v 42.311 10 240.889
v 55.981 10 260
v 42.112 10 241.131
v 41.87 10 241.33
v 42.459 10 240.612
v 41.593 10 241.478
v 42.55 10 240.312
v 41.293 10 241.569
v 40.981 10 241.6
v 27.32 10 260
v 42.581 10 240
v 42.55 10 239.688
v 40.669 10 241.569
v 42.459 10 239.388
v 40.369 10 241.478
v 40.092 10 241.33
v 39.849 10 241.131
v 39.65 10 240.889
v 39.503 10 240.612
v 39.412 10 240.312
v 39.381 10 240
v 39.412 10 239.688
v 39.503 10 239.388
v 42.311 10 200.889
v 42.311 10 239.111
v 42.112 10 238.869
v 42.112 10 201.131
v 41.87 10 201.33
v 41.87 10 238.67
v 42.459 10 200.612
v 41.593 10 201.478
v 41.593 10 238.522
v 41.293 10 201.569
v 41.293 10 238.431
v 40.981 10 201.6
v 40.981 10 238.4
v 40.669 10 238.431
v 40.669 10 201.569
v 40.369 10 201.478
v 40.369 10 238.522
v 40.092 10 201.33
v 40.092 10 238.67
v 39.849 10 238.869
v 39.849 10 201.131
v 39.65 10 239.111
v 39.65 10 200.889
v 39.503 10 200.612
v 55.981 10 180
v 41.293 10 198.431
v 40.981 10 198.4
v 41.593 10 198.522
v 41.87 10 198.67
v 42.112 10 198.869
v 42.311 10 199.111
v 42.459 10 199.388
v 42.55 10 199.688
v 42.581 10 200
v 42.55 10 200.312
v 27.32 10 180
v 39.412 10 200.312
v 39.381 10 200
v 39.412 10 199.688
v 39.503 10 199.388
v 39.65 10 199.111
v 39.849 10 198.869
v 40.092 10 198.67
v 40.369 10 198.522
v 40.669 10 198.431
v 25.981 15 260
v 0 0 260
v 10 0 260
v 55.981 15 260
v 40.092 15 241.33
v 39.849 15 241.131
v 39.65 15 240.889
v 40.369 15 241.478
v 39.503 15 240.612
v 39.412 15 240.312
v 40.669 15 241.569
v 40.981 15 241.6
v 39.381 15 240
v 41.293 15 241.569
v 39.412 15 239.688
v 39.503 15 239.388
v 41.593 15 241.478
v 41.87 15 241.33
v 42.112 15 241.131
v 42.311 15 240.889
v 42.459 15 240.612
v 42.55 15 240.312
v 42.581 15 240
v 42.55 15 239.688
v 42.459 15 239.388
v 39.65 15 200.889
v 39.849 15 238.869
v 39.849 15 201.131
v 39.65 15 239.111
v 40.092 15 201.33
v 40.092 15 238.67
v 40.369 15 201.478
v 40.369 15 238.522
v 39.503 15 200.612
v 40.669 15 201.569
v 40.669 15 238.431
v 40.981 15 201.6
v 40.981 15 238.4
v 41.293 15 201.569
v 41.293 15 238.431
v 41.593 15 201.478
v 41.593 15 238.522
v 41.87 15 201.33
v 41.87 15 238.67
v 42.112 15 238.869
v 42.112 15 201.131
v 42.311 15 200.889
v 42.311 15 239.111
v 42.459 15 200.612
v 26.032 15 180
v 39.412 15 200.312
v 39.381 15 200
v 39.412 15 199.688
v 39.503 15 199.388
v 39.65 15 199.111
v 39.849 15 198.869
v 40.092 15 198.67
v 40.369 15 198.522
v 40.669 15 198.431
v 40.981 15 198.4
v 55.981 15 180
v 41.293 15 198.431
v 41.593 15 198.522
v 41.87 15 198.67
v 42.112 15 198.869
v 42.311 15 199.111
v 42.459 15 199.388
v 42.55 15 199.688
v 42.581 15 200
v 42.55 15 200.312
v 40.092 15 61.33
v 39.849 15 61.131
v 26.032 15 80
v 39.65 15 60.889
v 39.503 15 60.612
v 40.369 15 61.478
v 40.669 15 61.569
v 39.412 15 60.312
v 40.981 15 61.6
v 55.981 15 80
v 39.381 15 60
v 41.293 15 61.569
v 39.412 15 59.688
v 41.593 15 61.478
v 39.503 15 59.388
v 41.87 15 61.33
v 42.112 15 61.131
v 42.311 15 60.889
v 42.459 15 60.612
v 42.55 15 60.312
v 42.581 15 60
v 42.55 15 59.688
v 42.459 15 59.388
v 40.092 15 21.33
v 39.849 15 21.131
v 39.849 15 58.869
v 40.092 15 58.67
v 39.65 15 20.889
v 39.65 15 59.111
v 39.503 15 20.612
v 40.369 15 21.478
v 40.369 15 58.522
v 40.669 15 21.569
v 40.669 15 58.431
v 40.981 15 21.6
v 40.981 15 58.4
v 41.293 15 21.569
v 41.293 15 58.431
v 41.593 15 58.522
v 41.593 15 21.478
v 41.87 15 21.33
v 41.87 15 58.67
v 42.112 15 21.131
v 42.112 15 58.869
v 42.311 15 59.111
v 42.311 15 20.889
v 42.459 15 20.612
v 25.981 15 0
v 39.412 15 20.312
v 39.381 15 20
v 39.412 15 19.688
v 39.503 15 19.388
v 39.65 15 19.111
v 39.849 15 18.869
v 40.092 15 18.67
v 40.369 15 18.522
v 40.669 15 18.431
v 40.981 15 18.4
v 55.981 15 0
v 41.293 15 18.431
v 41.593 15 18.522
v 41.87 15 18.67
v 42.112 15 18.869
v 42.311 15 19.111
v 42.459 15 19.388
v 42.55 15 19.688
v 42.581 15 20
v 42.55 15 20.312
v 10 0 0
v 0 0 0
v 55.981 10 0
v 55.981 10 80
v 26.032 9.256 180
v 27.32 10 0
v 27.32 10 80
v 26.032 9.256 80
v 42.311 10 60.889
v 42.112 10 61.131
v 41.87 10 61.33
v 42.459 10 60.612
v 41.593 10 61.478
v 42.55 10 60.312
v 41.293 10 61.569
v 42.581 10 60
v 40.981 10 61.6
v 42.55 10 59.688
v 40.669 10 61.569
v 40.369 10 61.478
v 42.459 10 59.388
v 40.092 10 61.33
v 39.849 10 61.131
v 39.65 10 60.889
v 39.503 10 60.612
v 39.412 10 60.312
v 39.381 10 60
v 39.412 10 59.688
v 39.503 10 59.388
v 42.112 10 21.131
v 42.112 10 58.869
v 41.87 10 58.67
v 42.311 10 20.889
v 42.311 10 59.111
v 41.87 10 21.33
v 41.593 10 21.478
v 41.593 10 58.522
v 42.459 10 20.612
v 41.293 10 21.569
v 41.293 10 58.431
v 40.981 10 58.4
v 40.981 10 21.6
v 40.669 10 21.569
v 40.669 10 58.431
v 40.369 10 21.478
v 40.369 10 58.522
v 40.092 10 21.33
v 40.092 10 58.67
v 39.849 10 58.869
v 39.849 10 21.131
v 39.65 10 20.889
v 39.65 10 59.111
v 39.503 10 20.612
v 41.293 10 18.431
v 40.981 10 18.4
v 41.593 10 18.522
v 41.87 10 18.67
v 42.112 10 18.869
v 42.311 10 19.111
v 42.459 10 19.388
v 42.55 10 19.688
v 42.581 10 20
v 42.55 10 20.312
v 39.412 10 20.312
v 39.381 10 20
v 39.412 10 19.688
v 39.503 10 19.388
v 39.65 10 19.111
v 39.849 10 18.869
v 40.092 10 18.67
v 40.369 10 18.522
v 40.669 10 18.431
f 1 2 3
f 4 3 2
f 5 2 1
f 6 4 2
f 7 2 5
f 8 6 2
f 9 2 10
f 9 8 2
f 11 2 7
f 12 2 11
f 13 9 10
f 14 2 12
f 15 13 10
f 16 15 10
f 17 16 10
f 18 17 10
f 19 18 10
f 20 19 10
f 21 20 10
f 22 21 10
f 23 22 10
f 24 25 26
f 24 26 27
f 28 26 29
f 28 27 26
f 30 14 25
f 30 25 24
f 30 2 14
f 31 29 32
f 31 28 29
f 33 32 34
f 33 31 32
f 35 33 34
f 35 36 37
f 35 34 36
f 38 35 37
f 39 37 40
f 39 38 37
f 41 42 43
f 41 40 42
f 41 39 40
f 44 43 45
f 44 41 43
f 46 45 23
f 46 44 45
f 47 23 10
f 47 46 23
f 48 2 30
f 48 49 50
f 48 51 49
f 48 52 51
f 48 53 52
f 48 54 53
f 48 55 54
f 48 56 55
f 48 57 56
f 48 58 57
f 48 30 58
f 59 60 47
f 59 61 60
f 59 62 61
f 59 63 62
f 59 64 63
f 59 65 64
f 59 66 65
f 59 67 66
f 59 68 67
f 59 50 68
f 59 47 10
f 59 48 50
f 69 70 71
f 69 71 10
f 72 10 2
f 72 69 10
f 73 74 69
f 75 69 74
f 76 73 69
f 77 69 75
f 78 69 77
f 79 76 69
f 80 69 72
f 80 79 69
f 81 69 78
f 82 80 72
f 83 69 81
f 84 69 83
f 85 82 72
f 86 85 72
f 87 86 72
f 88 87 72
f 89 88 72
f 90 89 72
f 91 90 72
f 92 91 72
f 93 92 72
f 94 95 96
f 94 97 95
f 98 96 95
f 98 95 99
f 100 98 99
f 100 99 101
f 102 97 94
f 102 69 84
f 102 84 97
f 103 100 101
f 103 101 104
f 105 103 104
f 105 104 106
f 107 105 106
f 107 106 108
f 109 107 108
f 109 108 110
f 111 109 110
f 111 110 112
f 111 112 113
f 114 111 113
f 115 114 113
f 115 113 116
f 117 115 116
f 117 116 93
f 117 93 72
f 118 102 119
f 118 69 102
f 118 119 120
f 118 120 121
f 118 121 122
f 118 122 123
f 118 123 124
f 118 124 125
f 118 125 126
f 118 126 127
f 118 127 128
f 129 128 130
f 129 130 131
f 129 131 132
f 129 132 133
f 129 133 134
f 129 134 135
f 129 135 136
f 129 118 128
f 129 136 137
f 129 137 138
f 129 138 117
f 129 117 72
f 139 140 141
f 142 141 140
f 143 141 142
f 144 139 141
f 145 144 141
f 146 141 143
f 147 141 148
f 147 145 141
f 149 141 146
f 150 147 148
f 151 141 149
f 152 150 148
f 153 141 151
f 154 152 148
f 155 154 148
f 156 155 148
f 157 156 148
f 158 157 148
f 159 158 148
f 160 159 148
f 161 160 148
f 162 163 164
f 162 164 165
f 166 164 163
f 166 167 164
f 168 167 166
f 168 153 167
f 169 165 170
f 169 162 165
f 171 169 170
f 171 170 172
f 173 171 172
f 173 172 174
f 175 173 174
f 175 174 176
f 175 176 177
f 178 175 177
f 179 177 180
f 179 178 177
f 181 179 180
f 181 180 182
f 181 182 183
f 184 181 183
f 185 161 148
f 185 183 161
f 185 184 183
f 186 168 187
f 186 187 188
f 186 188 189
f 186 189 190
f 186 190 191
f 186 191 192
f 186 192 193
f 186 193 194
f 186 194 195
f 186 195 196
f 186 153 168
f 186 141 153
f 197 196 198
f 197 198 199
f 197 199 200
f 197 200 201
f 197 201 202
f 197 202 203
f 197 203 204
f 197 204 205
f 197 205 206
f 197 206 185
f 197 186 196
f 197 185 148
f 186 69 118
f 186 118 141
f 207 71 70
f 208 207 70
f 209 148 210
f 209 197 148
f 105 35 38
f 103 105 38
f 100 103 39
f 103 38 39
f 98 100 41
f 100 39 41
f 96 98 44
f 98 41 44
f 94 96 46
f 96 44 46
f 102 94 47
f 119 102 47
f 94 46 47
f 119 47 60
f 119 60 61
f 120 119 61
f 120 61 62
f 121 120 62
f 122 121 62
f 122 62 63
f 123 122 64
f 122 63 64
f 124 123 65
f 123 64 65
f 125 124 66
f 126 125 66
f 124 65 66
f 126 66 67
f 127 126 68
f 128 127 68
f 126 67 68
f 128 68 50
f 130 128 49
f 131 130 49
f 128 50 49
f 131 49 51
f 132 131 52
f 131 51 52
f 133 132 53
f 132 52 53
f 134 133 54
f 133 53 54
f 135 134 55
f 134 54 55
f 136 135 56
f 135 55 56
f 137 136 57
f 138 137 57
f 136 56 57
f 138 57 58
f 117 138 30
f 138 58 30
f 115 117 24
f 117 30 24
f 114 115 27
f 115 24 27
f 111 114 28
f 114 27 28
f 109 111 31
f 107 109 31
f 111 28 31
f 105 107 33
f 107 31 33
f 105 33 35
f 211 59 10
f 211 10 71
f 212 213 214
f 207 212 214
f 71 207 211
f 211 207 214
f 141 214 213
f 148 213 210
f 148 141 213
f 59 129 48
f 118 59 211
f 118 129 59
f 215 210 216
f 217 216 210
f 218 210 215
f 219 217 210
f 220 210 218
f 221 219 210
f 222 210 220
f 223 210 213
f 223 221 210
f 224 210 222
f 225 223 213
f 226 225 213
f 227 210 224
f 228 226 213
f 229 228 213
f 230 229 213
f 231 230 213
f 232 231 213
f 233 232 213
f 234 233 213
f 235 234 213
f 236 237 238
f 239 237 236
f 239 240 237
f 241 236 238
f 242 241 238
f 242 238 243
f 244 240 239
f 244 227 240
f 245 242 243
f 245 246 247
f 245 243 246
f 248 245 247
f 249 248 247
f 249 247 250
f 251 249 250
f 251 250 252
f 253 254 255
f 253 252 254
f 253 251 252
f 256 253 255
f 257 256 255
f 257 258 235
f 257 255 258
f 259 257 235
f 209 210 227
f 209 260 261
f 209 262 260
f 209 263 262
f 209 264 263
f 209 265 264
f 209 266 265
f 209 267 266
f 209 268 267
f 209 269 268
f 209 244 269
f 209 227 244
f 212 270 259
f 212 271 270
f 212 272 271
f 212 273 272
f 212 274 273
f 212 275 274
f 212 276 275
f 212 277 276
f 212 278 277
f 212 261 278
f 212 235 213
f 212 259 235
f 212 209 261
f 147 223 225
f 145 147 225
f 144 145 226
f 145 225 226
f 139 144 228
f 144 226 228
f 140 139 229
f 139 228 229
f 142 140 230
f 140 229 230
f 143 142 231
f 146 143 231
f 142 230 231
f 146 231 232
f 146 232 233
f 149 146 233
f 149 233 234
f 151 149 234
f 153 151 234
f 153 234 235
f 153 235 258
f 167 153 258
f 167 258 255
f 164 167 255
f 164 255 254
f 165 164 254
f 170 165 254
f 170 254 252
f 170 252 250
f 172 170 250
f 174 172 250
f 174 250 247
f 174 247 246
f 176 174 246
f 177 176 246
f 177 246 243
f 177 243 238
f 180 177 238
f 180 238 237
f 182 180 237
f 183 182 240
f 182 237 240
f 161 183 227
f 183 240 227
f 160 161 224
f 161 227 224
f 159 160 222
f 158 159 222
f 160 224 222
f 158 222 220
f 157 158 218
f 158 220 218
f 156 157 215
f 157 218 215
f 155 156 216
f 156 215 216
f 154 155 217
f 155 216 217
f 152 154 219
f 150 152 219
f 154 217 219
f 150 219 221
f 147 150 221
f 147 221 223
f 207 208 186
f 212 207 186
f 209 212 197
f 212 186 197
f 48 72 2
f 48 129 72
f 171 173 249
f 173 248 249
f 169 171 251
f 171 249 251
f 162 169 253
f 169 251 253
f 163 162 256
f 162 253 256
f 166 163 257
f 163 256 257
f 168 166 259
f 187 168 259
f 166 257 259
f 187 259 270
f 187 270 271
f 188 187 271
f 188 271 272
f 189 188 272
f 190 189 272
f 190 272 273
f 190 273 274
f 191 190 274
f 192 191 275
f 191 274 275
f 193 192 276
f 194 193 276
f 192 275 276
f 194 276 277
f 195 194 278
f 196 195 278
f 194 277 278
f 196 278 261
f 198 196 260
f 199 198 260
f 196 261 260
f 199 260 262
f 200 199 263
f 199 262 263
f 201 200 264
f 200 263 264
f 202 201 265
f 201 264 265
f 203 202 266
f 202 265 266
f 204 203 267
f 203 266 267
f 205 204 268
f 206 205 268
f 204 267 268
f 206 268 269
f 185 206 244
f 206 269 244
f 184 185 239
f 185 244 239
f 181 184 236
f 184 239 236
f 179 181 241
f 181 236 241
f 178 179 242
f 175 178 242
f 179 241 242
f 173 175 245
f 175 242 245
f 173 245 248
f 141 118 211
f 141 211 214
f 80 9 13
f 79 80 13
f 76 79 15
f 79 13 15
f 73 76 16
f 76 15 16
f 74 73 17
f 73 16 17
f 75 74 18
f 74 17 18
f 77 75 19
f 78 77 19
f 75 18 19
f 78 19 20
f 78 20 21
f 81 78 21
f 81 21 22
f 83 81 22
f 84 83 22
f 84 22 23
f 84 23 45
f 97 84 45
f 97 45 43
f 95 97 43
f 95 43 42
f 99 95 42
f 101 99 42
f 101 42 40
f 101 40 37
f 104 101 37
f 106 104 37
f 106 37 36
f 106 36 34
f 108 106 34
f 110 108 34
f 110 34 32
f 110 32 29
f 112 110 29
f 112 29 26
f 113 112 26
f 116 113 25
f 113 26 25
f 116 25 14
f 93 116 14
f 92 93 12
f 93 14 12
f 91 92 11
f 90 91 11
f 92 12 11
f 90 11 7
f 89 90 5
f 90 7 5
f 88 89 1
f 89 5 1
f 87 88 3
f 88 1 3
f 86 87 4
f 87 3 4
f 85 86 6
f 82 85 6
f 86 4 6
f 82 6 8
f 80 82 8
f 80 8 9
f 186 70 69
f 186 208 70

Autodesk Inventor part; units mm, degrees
ref_plane "YZ Plane" through (0, 0, 0) normal (1, 0, 0) x (0, 1, 0)
ref_plane "XZ Plane" through (0, 0, 0) normal (0, 1, 0) x (-1, 0, 0)
ref_plane "XY Plane" through (0, 0, 0) normal (0, 0, 1) x (1, 0, 0)
sketch "スケッチ1" plane through (0, 0, 0) normal (0, 0, 1) x (1, 0, 0)
  line L0 (0, 0) -> (25.9808, 15)
  line L1 (25.9808, 15) -> (55.9808, 15)
  line L2 (55.9808, 15) -> (55.9808, 10)
  line L3 (55.9808, 10) -> (27.3205, 10)
  line L4 (27.3205, 10) -> (10, 0)
  line L5 (10, 0) -> (0, 0)
  dimension "d0" = 15
  dimension "d1" = 5
  dimension "d2" = 5
  dimension "d3" = 30
  dimension "d21" = 30
extrude "押し出し1" add sketch "スケッチ1" along normal blind 260
sketch "スケッチ2" plane through (25.9808, 15, 0) normal (0, 1, 0) x (1, 0, 0)
  line L0 (0.0508, -80) -> (34.0508, -80)
  line L1 (34.0508, -80) -> (34.0508, -180)
  line L2 (34.0508, -180) -> (0.0508, -180)
  line L3 (0.0508, -180) -> (0.0508, -80)
  line L4 (30, 0) -> (0, 0) projected
  line L5 (30, -260) -> (0, -260) projected
  point P0 (-25.9808, 0)
  point P1 (15, 0)
  point P2 (17.0508, -180)
  point P3 (15, -260)
  dimension "d7" = 80
  dimension "d8" = 80
  dimension "d22" = 34
extrude "押し出し2" cut sketch "スケッチ2" against normal blind 300
sketch "スケッチ3" plane through (25.9808, 15, 0) normal (0, 1, 0) x (1, 0, 0)
  line L0 (30, 0) -> (30, -260) projected
  line L1 (30, 0) -> (0, 0) projected
  line L2 (30, -260) -> (0, -260) projected
  point P0 (-25.9808, 0)
  point P1 (15, -20)
  point P2 (15, -200)
  point P3 (30, -80)
  point P4 (15, -60)
  point P5 (15, -240)
  point P6 (15, -260)
  dimension "d12" = 15
  dimension "d13" = 20
  dimension "d23" = 40
  dimension "d24" = 20
  dimension "d25" = 40
hole "穴1" at (40.9808, 15, 20) at (40.9808, 15, 200) at (40.9808, 15, 60) at (40.9808, 15, 240) direction (0, -1, 0) diameter 3.2 depth 10 tip angle 118
properties part number "バンパー"
